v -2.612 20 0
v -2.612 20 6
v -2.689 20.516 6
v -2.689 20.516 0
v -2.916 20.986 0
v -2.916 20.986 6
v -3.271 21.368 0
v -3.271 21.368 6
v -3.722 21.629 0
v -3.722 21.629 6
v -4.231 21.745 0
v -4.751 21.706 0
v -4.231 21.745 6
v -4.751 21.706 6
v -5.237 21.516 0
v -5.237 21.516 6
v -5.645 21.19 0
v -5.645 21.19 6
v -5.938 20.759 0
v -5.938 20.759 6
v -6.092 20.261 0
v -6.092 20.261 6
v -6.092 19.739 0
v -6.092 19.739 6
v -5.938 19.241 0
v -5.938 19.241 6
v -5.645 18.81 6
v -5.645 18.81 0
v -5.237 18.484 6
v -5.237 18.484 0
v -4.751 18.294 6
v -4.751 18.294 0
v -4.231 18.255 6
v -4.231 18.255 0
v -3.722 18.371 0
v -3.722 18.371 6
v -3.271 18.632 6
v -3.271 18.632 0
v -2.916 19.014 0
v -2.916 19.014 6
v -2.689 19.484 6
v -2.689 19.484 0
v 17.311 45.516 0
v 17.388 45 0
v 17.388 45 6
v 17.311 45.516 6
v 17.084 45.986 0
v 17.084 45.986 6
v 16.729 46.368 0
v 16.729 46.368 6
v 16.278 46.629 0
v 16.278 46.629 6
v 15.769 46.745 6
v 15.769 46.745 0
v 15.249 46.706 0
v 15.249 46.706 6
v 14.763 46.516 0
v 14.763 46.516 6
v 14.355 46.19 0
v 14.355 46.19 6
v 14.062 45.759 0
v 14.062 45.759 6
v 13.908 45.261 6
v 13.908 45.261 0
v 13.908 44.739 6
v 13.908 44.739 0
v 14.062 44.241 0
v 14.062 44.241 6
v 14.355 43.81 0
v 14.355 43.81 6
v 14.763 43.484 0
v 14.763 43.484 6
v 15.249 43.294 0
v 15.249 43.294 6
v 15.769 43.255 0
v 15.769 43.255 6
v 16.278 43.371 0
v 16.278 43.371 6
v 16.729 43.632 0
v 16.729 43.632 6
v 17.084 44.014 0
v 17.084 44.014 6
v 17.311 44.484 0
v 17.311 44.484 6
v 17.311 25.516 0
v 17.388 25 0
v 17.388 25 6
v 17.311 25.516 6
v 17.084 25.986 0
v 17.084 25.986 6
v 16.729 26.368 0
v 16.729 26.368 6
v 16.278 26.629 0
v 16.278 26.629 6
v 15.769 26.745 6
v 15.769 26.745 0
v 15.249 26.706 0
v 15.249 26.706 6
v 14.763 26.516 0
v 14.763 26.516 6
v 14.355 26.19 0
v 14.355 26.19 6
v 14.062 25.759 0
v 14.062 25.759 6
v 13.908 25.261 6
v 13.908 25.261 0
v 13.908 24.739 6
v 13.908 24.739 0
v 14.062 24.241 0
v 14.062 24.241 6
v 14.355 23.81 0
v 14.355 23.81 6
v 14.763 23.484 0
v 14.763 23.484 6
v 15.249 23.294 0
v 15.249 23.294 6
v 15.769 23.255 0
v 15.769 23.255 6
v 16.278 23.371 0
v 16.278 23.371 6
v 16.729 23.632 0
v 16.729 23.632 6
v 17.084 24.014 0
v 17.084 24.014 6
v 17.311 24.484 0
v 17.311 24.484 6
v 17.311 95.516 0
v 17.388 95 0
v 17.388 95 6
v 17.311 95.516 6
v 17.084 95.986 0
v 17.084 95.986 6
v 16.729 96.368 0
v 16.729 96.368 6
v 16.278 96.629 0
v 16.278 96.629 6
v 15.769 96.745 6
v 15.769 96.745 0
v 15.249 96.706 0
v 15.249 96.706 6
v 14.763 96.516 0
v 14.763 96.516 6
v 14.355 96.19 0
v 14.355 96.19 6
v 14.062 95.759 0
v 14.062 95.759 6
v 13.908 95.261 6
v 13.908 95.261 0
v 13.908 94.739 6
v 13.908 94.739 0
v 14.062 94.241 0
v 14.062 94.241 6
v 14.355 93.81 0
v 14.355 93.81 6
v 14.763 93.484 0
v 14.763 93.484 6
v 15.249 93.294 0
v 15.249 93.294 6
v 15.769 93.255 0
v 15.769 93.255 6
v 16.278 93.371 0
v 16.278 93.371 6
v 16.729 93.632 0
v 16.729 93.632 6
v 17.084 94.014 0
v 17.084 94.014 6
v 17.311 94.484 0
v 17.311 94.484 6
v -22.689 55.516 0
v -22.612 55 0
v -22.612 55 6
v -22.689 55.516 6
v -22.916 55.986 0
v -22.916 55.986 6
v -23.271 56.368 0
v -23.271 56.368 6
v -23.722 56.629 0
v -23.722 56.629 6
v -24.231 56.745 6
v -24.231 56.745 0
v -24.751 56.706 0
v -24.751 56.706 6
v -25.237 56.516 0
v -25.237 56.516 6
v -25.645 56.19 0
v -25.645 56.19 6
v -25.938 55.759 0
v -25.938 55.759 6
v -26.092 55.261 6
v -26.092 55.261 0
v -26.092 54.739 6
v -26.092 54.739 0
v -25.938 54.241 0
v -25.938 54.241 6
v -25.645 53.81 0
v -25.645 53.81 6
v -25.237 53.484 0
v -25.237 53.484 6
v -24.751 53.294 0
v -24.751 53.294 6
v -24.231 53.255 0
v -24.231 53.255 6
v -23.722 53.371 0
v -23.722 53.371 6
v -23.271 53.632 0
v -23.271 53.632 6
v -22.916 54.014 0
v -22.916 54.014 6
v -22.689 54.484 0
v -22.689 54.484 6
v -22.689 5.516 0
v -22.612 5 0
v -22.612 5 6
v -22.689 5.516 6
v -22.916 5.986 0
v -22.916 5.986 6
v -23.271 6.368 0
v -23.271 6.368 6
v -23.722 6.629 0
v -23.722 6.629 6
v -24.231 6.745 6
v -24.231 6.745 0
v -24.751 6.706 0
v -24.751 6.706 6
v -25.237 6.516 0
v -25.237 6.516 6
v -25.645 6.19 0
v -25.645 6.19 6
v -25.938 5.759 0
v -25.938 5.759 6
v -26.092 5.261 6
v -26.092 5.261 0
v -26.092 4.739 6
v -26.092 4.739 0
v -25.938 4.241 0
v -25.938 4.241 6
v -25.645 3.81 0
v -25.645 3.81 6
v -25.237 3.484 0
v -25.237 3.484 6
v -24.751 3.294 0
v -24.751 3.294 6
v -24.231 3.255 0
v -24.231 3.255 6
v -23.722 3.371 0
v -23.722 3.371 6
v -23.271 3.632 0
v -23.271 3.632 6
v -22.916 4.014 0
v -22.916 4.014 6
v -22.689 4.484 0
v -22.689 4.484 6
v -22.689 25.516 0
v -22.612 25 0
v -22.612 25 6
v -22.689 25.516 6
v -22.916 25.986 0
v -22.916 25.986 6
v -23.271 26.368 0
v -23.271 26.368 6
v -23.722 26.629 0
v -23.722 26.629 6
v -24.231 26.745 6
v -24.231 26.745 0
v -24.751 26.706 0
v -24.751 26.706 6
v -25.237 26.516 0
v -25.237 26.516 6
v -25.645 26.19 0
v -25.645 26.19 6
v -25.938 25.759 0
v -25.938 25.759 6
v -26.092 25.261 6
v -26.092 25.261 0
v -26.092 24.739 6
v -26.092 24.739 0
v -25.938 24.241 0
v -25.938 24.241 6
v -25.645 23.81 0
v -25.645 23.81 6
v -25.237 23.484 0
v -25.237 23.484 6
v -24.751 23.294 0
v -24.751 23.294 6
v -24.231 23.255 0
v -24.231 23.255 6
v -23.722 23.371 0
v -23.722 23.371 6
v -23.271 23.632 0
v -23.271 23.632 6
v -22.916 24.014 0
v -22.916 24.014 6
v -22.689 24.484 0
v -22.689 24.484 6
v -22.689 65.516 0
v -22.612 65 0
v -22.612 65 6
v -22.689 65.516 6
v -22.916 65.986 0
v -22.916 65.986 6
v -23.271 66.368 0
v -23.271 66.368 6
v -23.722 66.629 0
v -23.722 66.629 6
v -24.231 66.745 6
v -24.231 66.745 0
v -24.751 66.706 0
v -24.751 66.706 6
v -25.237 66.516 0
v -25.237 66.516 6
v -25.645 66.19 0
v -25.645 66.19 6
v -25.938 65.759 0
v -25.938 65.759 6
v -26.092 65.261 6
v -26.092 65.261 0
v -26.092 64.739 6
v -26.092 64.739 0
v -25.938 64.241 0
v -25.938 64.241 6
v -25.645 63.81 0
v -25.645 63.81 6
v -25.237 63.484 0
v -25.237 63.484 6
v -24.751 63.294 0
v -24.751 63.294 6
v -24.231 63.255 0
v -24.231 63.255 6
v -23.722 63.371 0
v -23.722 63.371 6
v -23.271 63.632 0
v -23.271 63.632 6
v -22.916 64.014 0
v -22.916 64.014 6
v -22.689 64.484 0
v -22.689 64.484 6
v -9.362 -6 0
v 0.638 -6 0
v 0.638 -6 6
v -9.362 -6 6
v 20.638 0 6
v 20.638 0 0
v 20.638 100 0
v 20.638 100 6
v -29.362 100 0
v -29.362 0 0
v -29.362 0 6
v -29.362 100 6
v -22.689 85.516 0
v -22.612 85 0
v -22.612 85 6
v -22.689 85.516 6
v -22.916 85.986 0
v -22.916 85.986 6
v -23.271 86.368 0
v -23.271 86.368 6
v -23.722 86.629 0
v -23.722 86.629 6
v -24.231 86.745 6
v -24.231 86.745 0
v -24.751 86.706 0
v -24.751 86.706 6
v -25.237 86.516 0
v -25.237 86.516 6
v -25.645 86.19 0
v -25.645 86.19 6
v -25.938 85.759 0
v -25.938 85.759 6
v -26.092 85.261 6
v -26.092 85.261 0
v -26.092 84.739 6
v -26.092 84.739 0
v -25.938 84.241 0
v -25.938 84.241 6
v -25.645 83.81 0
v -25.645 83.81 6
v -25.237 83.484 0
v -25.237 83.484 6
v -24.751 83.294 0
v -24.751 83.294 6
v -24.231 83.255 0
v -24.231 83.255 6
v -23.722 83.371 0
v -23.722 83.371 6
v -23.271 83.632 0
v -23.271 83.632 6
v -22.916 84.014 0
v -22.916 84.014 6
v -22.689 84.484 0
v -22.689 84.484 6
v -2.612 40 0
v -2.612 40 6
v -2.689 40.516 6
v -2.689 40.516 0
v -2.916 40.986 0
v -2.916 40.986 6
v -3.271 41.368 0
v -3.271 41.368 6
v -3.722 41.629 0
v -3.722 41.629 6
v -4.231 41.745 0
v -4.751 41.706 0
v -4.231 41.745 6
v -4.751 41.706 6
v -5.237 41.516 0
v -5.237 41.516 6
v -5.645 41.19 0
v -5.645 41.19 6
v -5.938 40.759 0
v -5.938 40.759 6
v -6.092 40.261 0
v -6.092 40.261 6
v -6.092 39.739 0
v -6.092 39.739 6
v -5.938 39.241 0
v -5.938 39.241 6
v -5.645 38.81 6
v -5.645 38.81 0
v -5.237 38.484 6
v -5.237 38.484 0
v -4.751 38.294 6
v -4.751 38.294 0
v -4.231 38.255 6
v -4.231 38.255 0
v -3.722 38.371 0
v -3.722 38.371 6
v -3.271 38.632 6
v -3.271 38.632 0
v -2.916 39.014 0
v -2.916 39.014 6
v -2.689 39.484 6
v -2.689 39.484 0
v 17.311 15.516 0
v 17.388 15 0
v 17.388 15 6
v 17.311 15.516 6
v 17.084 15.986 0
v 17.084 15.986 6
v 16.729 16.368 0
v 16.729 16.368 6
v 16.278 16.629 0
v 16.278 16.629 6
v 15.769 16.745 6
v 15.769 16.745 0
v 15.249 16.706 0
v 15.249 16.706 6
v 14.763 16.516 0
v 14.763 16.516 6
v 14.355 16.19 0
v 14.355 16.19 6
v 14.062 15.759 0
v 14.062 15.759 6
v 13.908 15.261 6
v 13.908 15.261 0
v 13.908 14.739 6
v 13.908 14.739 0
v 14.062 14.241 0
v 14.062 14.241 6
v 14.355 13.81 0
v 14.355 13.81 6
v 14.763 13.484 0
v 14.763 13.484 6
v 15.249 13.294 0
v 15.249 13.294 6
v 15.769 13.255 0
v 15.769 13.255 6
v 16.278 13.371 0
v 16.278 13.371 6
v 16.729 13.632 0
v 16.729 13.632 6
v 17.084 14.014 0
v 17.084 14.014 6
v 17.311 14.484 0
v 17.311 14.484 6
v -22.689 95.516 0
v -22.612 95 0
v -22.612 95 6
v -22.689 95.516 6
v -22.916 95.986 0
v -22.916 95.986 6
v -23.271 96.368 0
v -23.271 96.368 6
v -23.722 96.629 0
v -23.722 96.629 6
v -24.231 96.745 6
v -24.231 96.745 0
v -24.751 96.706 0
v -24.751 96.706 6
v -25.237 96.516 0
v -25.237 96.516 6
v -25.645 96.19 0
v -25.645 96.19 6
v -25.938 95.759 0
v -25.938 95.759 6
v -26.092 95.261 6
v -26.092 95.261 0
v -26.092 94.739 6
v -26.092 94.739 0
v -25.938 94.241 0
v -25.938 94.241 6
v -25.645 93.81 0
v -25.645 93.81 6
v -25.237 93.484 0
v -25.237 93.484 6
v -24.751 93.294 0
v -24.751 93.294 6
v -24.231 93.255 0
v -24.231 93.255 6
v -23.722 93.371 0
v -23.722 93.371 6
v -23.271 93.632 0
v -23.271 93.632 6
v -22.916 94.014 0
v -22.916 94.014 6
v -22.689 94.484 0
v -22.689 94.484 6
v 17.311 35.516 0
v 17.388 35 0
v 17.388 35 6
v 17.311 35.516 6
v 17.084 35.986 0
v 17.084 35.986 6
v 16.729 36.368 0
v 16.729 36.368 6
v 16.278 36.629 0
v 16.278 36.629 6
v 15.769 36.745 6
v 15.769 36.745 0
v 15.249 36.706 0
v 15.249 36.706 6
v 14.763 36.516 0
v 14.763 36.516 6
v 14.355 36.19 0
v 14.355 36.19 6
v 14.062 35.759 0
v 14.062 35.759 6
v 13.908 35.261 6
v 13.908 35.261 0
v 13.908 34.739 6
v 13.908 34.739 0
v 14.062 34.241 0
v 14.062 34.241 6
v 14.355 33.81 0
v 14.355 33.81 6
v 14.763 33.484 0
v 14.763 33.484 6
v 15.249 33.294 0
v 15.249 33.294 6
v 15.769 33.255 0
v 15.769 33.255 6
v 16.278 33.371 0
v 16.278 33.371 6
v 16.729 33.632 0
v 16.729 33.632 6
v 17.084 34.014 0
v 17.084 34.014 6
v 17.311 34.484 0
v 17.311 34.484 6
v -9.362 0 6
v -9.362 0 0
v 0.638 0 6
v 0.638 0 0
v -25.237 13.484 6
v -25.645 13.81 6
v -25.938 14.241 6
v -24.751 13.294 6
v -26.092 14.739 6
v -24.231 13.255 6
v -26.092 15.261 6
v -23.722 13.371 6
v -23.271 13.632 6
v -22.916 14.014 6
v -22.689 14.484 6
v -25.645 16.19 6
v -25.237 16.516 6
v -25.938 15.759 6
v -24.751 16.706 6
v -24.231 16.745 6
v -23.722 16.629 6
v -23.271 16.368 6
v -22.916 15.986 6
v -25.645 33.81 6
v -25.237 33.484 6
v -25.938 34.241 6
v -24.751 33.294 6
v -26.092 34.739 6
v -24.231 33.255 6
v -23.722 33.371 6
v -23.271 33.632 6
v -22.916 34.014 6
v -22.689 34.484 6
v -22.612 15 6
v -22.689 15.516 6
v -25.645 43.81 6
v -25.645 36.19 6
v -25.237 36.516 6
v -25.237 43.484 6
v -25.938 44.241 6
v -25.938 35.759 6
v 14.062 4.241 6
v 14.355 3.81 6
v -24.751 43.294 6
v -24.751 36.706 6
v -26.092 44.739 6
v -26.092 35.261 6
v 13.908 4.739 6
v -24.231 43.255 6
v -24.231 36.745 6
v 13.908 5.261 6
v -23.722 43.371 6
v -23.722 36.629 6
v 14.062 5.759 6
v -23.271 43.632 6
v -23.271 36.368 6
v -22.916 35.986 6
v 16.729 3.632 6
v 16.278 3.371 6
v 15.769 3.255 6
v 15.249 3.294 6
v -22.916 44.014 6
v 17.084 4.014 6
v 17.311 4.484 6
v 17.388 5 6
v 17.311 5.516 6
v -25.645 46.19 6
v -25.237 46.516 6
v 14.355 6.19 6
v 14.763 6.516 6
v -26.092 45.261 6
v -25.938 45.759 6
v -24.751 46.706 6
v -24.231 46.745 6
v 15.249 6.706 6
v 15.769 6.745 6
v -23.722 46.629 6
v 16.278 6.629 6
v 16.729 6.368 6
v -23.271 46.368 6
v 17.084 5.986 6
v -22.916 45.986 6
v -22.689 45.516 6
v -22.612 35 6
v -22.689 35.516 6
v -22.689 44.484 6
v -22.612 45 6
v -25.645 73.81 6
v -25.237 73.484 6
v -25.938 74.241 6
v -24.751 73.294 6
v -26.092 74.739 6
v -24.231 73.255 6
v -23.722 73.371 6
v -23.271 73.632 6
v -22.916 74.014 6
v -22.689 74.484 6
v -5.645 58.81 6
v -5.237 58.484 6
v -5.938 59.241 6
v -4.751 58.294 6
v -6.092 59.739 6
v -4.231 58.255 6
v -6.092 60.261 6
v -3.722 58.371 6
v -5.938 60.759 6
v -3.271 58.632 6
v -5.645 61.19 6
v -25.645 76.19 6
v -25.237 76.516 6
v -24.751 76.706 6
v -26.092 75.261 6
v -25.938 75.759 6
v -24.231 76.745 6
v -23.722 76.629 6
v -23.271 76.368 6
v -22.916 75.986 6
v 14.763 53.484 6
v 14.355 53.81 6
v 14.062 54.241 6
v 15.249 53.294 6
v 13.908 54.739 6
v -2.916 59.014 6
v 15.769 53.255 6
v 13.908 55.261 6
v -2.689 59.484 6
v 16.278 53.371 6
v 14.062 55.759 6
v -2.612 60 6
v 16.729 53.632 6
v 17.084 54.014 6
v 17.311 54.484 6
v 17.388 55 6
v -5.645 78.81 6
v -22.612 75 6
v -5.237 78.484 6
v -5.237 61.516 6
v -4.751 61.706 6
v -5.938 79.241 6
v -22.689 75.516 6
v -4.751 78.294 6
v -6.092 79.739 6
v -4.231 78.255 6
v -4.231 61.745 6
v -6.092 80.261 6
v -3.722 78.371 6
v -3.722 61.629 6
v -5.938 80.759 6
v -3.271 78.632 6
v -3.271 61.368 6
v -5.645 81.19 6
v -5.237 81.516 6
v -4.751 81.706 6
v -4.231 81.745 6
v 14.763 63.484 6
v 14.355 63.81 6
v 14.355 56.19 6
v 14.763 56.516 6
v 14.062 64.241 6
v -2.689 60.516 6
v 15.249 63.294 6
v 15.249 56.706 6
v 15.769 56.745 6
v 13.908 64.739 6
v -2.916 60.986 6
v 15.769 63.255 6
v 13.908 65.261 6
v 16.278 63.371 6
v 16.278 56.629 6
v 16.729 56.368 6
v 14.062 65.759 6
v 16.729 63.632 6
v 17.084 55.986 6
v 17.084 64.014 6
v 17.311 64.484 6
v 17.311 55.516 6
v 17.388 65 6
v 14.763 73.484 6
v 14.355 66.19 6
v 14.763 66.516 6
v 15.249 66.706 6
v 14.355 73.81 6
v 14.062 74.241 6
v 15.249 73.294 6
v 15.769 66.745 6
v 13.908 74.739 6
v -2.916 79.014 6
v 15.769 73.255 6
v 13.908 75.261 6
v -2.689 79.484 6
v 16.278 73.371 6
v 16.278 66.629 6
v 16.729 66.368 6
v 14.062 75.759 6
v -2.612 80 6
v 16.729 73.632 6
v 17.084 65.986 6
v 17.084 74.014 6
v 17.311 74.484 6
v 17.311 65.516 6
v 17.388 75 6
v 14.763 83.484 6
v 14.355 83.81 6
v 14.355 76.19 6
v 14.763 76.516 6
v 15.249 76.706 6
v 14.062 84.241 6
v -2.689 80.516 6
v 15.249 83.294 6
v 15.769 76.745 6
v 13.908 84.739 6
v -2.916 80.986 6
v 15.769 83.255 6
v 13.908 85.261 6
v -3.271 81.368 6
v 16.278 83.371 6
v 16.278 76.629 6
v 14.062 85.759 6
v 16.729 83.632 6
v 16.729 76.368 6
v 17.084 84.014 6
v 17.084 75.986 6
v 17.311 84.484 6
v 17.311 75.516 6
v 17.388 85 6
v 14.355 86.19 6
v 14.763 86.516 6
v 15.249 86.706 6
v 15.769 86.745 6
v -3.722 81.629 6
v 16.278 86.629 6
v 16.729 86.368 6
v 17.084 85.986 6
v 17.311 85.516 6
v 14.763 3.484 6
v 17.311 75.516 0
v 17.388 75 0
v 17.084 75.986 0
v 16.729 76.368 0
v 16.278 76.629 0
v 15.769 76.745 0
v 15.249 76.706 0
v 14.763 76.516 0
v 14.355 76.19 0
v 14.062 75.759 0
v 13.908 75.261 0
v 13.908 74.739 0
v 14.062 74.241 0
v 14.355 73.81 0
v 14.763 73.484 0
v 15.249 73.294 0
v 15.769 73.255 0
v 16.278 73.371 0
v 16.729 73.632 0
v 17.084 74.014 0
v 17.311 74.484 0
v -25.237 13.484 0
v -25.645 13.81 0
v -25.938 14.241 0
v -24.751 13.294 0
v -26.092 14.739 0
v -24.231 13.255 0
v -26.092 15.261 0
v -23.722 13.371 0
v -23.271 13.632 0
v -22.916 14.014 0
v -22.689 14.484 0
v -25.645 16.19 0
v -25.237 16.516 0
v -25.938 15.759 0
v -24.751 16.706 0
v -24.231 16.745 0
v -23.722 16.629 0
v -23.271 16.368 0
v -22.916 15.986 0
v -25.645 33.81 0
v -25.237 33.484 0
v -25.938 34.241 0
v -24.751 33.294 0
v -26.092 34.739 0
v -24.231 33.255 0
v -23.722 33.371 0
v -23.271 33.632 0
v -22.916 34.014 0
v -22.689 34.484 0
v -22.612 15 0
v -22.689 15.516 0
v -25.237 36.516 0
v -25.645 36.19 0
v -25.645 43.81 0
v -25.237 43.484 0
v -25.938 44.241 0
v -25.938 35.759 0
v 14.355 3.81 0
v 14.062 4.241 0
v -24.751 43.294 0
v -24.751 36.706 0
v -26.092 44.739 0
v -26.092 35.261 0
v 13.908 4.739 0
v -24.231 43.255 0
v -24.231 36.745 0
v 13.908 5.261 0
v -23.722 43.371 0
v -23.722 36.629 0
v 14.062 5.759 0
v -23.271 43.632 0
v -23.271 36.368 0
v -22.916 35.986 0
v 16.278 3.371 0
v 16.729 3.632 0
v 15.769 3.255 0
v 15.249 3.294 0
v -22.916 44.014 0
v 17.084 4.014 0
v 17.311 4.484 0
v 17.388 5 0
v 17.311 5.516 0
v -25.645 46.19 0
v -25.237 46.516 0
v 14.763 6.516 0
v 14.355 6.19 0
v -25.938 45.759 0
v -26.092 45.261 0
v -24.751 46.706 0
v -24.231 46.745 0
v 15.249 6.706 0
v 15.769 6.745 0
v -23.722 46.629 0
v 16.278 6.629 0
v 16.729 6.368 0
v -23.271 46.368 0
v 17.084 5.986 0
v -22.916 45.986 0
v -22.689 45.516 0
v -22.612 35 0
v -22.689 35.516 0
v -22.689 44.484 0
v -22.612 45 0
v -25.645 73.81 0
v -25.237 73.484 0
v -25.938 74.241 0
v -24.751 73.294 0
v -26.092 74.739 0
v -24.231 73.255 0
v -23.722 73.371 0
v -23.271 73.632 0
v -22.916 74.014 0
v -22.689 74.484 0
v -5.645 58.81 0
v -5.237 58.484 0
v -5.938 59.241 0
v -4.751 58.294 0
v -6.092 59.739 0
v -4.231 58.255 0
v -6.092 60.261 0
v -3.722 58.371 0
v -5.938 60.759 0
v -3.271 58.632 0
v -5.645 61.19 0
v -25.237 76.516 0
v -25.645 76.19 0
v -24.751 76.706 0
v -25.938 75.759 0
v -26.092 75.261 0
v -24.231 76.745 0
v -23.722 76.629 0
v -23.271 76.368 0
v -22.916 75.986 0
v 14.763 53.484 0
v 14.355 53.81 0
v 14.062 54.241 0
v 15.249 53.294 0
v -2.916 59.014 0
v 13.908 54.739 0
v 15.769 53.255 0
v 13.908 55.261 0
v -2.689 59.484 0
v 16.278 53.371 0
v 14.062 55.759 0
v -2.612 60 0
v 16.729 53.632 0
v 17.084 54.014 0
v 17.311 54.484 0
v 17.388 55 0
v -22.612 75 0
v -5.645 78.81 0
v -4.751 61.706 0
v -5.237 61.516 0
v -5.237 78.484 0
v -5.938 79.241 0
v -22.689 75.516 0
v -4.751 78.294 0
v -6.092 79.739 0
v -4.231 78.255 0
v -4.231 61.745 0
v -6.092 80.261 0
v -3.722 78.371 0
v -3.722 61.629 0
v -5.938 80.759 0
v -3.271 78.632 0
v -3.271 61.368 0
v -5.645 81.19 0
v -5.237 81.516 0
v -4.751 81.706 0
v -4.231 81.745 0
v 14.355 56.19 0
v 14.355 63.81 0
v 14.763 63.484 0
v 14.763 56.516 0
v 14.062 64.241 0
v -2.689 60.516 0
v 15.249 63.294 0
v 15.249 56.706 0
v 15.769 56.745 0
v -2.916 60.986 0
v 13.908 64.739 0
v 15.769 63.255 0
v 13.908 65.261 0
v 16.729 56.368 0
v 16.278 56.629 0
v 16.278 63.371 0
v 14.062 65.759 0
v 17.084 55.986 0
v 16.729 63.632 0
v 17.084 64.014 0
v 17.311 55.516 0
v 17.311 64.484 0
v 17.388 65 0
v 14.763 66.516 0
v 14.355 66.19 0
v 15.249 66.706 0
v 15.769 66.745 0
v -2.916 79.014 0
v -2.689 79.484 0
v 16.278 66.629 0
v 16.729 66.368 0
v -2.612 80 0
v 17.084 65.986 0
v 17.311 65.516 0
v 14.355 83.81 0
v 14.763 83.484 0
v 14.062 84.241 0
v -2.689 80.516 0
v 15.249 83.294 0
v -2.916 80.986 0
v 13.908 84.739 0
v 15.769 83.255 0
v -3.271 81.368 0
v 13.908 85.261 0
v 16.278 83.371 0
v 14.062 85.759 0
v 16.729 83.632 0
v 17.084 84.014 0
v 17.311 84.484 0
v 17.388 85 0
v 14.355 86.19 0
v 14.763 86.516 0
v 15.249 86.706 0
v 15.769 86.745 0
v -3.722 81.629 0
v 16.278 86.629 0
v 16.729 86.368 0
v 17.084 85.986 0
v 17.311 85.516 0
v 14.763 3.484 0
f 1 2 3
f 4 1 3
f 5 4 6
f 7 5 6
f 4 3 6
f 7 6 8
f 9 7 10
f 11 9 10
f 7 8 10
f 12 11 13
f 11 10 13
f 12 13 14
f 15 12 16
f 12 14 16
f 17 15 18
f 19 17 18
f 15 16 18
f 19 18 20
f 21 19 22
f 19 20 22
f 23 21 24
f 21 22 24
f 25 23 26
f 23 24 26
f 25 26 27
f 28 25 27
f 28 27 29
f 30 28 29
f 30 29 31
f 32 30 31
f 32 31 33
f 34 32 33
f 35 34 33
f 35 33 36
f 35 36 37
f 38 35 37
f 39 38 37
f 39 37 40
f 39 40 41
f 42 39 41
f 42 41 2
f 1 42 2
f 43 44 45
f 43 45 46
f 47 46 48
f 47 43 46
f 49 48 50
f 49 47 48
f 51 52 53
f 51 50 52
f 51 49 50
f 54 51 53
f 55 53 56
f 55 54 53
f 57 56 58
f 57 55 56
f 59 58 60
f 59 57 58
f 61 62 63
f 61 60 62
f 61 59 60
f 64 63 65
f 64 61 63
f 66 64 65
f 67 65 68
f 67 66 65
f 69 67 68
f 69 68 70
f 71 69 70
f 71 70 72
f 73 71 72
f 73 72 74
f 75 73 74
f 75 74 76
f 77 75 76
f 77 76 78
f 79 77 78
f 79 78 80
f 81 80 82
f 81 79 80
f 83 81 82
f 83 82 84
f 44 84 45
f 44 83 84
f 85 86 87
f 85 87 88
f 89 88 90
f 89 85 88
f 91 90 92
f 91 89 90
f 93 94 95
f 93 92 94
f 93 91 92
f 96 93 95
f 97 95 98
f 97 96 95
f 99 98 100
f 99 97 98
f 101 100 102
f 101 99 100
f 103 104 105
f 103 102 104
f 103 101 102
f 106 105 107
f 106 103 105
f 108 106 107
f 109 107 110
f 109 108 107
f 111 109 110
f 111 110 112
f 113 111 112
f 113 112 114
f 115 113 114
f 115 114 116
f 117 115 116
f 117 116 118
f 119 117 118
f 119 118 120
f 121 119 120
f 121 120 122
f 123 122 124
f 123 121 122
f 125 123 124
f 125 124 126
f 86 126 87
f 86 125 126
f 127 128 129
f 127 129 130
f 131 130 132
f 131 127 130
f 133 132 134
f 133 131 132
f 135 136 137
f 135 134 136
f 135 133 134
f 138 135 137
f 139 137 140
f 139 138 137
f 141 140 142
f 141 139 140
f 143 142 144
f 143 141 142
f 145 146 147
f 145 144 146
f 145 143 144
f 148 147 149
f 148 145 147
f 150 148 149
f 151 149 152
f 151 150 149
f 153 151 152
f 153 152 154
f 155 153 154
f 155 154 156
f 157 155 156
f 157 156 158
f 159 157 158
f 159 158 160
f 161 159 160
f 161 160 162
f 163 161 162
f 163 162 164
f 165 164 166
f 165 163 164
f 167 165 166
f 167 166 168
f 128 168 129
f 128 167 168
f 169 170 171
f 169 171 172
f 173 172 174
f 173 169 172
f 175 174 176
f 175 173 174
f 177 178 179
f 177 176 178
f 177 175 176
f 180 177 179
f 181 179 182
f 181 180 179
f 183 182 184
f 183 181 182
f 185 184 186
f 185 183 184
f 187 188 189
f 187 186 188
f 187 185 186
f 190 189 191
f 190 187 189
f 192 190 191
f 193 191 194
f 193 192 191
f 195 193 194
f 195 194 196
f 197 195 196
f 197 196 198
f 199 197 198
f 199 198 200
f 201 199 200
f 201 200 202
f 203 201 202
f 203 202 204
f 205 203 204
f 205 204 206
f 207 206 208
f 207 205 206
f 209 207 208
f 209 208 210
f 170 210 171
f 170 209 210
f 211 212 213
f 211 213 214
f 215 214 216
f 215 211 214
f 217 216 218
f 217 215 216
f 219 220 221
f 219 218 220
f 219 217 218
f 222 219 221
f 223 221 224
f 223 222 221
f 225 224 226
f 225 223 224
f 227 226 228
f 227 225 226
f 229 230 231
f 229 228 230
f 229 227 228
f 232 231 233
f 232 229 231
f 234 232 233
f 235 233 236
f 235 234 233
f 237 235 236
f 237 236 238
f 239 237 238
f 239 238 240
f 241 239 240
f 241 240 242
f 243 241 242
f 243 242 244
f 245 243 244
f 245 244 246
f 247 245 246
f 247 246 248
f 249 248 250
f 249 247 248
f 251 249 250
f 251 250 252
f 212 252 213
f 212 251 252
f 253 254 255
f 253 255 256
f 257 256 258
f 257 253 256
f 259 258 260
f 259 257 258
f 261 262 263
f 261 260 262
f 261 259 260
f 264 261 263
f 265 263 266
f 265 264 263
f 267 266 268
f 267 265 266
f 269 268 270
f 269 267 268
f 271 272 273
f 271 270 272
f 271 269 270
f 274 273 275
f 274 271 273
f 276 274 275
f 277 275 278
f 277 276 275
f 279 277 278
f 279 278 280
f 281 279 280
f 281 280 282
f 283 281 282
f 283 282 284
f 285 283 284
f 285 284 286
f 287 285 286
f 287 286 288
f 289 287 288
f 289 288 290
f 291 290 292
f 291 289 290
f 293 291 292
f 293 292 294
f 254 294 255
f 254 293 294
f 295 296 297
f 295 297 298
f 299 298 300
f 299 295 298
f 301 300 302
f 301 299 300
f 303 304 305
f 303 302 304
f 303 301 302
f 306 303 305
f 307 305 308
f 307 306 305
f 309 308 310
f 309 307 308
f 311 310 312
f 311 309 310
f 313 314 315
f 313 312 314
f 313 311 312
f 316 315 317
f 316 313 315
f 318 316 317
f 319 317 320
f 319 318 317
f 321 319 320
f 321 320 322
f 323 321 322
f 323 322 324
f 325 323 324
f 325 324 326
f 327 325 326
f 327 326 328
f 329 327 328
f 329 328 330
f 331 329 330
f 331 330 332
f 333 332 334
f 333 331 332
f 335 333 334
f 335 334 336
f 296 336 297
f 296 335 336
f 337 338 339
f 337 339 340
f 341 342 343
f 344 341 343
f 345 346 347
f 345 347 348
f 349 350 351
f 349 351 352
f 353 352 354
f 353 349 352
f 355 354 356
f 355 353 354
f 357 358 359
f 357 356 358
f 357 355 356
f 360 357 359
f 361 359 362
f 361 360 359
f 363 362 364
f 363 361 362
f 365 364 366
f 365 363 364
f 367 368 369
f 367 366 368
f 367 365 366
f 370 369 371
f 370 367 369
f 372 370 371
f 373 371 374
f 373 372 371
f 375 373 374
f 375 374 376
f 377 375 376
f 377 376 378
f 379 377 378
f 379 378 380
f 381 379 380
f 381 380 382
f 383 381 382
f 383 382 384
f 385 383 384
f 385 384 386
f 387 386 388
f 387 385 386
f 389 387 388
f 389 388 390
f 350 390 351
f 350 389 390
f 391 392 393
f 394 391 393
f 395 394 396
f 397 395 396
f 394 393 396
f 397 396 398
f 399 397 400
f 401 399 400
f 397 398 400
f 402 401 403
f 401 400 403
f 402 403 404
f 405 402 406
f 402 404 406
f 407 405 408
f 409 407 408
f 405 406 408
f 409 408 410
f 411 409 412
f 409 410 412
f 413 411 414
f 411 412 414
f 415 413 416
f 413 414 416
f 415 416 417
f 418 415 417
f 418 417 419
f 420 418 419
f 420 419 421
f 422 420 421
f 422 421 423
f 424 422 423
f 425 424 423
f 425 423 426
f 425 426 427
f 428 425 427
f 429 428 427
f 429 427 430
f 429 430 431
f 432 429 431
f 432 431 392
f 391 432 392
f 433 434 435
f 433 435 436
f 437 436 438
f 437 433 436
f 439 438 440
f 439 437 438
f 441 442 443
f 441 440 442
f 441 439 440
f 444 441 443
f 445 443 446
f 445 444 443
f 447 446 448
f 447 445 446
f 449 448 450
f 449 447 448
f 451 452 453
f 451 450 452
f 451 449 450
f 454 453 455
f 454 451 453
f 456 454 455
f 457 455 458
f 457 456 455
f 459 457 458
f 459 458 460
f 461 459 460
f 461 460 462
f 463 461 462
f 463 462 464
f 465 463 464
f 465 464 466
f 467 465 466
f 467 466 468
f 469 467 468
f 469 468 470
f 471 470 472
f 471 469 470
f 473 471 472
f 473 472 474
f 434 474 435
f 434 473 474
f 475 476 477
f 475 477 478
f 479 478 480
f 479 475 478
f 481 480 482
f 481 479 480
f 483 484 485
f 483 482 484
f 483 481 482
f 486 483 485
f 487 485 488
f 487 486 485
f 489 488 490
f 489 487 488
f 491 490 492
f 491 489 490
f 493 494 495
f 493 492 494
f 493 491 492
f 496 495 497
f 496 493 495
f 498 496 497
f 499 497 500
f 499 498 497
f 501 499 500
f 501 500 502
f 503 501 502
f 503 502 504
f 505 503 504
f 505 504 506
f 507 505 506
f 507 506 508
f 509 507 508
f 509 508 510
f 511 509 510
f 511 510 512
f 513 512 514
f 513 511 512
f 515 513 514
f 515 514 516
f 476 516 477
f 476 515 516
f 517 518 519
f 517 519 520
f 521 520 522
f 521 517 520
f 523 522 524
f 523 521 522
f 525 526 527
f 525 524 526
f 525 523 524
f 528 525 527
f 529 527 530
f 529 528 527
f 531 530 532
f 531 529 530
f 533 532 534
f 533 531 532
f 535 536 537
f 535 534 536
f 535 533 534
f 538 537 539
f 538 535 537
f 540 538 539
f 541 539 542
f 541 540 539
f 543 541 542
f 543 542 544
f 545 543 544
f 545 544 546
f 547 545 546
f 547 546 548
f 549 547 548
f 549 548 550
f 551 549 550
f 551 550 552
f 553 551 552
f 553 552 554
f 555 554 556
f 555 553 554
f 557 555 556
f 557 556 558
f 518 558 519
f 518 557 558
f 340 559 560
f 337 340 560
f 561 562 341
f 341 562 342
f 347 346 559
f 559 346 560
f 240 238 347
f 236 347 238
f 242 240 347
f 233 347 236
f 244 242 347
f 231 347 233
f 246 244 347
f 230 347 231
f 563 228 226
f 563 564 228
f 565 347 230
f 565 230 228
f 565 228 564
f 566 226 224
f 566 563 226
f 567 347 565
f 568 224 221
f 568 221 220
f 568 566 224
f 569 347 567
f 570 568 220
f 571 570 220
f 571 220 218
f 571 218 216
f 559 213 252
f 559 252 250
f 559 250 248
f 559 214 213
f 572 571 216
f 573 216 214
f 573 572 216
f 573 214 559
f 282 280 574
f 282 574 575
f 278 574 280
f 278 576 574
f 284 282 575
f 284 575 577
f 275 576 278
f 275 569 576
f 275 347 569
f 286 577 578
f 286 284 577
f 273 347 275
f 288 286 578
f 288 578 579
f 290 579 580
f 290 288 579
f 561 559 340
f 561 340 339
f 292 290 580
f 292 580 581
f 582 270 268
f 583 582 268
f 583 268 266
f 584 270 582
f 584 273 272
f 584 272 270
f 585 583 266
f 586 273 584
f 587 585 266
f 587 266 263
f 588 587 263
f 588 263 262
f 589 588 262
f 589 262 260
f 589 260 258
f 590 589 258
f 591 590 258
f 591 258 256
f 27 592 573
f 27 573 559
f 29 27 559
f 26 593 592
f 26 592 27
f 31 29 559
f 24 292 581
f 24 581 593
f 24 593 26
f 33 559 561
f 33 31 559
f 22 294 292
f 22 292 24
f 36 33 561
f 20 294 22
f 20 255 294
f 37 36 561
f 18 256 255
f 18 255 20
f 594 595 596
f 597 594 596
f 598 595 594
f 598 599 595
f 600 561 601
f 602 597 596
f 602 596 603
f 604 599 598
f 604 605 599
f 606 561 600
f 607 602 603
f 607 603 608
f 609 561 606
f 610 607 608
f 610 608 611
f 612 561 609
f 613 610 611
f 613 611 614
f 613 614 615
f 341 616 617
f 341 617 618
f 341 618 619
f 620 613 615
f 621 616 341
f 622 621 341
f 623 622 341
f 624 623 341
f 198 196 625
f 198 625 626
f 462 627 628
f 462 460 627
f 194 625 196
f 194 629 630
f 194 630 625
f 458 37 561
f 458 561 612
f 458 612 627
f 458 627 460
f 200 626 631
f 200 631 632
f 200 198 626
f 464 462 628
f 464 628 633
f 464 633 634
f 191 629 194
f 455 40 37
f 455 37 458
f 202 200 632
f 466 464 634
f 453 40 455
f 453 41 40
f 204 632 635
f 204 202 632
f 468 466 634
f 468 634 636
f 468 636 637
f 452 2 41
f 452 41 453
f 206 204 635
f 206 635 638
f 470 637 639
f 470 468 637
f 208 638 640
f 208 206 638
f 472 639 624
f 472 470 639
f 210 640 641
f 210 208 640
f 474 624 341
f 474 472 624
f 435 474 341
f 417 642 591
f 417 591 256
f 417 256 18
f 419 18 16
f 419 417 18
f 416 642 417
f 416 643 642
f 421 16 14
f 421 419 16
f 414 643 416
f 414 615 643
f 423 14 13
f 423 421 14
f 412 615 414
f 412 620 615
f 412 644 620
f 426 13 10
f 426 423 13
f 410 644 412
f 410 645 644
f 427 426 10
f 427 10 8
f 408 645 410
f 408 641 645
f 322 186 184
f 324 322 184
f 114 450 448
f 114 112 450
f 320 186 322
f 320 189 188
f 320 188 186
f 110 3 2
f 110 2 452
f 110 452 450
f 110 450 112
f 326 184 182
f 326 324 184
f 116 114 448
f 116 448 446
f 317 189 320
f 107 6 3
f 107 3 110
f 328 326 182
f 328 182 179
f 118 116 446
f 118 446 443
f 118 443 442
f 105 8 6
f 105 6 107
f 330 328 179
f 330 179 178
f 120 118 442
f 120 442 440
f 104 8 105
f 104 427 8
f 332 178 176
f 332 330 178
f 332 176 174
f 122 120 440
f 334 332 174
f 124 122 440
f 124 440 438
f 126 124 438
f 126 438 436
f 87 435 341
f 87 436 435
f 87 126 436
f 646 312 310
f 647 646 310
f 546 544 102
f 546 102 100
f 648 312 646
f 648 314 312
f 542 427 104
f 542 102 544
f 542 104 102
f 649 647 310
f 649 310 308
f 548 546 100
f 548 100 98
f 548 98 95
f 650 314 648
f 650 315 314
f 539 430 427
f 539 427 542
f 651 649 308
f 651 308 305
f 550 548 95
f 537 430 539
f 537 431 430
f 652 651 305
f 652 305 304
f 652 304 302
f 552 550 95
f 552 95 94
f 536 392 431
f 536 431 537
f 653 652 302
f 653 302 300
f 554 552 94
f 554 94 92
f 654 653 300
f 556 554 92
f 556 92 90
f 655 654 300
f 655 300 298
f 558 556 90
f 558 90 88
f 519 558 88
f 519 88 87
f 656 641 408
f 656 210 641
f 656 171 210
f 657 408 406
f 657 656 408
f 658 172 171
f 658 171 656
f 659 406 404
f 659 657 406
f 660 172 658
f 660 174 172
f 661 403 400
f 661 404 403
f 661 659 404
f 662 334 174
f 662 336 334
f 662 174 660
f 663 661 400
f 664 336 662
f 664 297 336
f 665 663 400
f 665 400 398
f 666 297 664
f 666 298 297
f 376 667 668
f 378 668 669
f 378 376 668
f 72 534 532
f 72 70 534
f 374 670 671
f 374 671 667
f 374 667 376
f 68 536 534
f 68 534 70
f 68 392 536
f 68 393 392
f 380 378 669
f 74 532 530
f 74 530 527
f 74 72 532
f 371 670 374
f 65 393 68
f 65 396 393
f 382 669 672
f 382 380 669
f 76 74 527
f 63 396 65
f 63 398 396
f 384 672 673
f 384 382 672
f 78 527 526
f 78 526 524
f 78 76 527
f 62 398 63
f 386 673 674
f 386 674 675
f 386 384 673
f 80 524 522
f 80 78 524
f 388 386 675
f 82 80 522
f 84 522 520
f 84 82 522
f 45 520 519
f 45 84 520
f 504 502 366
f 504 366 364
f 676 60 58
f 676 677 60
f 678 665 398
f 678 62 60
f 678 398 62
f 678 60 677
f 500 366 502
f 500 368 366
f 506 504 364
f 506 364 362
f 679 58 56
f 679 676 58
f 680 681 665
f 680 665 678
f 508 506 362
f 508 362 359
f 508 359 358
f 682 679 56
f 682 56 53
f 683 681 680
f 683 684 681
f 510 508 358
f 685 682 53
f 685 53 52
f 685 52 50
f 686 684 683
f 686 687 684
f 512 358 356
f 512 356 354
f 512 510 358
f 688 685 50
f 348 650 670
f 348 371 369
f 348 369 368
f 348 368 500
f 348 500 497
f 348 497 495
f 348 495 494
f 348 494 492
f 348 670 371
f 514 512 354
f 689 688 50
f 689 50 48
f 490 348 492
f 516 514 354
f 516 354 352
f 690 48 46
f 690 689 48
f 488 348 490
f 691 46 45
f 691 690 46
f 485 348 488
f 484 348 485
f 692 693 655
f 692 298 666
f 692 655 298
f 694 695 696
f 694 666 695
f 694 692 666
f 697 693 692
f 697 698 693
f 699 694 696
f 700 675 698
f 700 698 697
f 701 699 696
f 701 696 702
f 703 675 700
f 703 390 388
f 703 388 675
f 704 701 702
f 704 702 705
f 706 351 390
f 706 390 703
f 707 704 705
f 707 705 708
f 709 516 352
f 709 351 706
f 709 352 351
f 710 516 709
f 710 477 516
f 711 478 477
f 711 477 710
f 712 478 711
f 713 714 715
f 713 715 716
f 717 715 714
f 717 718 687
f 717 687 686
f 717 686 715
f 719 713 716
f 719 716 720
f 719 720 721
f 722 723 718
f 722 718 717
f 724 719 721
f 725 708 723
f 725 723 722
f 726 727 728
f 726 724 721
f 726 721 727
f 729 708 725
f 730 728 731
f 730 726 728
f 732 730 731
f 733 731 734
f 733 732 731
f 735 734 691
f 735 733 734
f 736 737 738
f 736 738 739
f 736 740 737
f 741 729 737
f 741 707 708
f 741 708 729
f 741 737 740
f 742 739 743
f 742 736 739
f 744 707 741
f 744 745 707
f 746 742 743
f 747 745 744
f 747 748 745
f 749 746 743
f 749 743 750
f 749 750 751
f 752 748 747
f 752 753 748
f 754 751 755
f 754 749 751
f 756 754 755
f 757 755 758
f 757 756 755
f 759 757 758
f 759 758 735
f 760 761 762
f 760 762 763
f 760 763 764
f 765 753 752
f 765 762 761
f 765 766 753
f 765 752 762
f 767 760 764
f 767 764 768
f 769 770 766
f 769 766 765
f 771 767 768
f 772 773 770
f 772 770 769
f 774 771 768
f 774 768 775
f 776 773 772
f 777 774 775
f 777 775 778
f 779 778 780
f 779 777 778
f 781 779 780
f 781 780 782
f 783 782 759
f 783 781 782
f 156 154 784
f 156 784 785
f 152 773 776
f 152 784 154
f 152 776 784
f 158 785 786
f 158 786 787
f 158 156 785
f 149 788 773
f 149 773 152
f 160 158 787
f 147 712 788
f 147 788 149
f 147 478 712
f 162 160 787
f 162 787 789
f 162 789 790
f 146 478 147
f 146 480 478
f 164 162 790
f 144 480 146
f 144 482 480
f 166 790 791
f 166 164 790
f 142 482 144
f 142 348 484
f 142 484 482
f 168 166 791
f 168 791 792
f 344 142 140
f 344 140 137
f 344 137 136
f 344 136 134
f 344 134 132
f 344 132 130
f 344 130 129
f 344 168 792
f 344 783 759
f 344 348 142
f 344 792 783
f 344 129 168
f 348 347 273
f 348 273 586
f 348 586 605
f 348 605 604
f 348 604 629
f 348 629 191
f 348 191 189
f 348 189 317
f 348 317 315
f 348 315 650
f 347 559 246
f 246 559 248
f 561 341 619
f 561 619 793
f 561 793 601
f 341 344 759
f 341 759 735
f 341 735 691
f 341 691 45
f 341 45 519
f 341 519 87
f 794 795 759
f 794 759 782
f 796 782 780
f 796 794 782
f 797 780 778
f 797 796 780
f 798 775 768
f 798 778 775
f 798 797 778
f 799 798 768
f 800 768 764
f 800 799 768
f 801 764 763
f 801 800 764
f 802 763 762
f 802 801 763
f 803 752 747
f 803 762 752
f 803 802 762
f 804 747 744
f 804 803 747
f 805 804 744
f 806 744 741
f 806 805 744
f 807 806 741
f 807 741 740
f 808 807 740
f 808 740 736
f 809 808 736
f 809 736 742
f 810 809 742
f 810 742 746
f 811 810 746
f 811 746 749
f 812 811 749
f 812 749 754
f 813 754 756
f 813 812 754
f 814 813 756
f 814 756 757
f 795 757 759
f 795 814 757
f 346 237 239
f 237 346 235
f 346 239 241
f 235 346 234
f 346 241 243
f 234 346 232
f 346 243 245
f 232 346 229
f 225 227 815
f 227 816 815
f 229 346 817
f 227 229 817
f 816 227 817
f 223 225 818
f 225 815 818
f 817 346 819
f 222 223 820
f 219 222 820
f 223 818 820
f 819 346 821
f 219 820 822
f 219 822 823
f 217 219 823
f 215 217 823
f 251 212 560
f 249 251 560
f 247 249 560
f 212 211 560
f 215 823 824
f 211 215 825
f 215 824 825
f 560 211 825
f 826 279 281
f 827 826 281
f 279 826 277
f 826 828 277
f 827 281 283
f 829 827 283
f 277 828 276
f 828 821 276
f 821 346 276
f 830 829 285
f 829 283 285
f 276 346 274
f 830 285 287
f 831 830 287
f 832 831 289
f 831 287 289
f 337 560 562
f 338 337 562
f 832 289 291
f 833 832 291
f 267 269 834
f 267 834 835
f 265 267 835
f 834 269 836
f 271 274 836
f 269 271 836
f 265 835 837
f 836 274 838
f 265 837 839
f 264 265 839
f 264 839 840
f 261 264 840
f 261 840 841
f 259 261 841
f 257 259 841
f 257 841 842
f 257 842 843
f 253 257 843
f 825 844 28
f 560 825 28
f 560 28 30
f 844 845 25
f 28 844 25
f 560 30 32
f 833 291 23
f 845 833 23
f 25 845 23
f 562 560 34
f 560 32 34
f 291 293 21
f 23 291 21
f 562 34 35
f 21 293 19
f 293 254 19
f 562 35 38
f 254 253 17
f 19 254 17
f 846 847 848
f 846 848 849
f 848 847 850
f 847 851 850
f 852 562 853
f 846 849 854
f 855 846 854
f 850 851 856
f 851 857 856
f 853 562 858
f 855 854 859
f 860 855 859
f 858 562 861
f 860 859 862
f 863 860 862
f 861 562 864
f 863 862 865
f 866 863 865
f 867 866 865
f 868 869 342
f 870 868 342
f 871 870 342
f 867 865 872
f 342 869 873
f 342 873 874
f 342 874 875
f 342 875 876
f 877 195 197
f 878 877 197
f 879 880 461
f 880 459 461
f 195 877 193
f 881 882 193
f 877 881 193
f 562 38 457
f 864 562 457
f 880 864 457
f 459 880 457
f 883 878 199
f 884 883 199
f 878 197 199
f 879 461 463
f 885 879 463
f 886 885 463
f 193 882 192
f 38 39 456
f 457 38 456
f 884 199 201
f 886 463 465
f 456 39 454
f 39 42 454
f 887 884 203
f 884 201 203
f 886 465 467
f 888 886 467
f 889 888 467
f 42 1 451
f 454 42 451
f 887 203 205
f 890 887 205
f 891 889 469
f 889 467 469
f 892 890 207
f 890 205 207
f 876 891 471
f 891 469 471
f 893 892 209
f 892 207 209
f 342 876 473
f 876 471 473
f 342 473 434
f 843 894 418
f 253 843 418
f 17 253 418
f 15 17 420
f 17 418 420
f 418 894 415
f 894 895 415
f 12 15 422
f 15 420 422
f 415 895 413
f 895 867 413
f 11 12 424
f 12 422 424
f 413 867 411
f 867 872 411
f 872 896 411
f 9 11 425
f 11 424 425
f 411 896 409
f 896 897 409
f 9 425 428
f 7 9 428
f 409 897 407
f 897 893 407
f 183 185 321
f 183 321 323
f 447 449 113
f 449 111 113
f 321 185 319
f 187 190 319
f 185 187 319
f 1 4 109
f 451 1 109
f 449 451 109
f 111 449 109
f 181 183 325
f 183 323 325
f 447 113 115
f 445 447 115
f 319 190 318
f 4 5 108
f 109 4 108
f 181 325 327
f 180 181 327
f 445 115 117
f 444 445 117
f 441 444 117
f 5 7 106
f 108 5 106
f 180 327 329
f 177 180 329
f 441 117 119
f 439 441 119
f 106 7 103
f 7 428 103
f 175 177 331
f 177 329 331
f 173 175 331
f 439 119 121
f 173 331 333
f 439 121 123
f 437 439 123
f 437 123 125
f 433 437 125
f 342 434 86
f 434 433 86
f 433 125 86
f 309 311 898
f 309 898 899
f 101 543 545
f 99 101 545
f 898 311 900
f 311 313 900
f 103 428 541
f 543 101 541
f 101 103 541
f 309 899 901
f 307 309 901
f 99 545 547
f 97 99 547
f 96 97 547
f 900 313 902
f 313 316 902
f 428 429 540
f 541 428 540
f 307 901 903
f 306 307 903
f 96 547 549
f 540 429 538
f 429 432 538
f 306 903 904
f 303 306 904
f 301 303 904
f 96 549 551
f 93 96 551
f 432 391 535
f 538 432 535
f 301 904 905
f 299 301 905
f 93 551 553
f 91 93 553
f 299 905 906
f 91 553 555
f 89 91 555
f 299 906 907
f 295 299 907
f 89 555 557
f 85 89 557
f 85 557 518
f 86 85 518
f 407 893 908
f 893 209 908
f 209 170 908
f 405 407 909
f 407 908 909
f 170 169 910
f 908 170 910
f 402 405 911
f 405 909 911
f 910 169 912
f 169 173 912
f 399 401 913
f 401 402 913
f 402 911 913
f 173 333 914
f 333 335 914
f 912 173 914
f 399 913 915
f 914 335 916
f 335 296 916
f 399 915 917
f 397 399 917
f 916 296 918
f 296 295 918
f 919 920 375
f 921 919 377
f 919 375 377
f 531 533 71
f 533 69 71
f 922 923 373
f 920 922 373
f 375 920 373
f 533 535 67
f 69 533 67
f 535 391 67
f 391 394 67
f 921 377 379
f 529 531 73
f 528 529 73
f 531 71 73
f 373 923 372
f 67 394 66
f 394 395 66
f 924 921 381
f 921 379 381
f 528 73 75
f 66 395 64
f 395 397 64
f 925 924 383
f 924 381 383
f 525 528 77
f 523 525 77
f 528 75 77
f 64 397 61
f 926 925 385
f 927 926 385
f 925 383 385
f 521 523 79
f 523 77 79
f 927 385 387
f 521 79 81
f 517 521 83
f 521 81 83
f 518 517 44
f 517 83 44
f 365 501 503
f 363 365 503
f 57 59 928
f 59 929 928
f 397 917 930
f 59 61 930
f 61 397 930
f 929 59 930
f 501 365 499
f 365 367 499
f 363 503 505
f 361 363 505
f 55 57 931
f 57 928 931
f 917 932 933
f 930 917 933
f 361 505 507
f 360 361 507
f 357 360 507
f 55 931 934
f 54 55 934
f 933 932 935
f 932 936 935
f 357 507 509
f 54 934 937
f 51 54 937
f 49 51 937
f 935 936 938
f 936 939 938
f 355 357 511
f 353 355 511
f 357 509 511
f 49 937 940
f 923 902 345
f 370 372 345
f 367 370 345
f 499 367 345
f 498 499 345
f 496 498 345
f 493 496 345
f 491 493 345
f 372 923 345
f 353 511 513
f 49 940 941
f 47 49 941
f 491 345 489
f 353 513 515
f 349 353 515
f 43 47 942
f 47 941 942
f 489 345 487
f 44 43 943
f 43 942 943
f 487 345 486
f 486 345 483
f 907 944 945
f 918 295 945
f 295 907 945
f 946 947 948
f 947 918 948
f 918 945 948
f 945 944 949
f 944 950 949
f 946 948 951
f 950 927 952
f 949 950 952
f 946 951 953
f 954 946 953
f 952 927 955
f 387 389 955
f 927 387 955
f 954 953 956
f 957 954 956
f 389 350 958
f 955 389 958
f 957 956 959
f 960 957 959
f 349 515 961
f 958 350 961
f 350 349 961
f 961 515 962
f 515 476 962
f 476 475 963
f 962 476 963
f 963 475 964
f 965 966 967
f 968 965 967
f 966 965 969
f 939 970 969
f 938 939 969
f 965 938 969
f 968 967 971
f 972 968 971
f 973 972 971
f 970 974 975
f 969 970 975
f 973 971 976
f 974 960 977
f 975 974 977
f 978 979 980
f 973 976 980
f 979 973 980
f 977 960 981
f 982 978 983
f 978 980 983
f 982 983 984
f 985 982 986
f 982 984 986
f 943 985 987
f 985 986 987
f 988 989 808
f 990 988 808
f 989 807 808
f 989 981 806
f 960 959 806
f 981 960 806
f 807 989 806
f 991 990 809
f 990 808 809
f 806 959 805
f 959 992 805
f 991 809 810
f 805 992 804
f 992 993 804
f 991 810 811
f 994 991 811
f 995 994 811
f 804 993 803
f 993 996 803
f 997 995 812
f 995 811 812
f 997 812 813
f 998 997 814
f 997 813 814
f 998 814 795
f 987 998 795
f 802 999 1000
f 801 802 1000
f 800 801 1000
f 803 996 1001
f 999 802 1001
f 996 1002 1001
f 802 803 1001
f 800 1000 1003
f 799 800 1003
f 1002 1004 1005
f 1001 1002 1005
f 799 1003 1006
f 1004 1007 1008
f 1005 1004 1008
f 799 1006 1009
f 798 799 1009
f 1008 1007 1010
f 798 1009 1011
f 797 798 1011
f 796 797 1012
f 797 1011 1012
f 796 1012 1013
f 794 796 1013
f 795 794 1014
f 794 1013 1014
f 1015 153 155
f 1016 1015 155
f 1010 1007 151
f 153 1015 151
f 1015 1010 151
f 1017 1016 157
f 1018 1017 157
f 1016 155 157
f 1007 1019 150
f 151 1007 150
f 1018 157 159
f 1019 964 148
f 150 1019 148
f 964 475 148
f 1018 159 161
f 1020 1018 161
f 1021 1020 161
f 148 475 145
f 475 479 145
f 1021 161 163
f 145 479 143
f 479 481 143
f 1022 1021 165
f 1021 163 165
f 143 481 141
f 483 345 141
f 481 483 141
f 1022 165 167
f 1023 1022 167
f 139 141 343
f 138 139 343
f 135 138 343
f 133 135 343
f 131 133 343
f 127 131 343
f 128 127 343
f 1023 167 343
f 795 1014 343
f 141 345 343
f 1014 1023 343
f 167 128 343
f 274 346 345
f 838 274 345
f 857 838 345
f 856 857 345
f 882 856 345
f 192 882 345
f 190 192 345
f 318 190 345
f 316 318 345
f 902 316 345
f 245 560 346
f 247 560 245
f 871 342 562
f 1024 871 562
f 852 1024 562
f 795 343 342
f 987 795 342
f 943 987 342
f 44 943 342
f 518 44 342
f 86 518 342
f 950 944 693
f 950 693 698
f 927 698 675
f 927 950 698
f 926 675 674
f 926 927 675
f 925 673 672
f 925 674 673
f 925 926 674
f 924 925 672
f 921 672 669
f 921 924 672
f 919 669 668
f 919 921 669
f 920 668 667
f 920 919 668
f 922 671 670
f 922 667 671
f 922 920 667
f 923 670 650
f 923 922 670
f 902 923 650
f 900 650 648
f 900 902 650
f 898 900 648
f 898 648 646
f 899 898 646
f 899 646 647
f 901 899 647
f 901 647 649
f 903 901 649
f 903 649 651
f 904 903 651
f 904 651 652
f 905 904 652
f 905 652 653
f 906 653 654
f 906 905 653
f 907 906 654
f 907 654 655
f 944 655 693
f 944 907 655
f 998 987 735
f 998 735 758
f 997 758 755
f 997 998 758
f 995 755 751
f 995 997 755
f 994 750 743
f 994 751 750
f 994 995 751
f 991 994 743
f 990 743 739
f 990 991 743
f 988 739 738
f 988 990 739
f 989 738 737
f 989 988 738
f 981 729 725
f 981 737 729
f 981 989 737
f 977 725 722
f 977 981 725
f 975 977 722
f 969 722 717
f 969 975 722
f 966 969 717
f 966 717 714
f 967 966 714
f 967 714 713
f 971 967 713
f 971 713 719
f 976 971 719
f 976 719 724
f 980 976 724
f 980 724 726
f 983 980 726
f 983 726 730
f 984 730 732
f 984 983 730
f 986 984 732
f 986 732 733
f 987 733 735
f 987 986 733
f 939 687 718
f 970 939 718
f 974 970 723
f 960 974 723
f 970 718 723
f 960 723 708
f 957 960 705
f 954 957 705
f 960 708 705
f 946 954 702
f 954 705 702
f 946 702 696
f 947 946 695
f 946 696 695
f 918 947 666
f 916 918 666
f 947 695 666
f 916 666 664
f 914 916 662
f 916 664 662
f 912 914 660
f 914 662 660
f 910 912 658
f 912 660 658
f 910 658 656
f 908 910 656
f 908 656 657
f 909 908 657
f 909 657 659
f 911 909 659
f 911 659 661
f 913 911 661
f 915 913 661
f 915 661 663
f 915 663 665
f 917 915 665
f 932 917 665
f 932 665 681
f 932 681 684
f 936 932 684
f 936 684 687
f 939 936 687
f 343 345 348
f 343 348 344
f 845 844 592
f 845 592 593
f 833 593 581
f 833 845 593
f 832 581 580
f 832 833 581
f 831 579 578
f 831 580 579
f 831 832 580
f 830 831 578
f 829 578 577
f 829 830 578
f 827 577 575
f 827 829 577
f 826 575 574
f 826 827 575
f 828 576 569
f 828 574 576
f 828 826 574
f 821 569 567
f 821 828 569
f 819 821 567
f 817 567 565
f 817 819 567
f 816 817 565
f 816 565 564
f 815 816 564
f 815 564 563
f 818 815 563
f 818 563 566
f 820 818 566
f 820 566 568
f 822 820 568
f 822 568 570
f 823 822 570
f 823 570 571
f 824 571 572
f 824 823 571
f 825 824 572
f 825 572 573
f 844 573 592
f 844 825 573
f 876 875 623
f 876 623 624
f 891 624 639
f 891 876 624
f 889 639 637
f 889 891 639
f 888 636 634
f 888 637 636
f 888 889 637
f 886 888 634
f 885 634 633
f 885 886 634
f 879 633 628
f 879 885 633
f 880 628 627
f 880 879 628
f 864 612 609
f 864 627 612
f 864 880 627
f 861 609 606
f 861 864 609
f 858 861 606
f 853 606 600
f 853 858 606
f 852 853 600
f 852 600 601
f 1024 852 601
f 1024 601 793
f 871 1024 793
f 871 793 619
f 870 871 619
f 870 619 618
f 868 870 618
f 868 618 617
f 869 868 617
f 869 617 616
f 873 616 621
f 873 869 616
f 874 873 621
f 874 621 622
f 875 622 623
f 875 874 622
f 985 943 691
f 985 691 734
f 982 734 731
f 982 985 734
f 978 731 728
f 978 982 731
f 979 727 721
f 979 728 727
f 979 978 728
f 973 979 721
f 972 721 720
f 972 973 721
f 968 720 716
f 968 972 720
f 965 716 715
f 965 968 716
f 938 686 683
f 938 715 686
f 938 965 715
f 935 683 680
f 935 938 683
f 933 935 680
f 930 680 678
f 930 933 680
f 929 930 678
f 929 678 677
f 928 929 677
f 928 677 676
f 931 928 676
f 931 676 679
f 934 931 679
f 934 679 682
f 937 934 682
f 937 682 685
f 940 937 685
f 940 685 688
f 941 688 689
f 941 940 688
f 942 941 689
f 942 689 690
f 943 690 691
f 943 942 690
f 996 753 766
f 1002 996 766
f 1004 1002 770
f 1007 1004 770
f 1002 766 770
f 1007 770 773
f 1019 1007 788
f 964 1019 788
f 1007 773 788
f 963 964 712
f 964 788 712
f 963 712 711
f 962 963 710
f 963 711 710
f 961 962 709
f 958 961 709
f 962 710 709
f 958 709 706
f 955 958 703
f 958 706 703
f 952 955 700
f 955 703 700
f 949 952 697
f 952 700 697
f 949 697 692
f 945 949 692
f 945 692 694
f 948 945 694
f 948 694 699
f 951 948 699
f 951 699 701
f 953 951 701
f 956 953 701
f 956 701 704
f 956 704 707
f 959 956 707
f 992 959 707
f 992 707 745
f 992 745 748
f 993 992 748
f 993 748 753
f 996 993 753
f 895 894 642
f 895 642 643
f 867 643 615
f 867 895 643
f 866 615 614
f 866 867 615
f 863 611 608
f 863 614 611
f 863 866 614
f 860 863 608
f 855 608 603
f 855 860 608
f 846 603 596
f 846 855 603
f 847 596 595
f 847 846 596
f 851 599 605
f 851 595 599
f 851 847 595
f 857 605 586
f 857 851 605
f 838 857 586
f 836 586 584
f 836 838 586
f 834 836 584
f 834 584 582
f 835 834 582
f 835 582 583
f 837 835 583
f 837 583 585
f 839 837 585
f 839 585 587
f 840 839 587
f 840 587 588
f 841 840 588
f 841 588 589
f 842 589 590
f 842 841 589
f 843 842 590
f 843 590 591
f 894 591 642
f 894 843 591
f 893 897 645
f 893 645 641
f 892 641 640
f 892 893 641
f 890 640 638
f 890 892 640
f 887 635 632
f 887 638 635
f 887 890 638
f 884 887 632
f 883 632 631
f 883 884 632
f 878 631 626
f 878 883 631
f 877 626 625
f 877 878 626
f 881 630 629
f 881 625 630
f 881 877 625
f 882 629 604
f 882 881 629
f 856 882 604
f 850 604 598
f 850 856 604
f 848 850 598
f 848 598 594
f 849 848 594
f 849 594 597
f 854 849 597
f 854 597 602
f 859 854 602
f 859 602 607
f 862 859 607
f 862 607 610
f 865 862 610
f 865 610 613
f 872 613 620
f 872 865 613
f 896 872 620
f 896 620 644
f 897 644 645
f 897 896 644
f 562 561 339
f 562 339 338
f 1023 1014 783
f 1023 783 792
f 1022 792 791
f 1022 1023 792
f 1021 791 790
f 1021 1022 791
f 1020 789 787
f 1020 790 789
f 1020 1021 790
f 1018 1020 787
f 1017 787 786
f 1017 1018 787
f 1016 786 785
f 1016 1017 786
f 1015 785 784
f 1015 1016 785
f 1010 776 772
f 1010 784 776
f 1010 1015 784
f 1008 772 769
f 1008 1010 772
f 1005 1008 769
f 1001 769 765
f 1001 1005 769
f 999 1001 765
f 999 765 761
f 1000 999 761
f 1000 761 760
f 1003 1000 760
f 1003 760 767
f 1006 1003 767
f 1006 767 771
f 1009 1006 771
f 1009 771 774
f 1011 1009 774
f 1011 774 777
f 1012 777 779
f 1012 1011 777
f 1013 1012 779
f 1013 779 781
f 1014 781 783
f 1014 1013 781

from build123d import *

# Parameters (mm, degrees)
ESBO_O1_W                  = 50
ESBO_O1_H                  = 100
RESSALTO_EXTRUS_O1_DEPTH   = 6
CORTE_EXTRUS_O1_DEPTH      = 105.394009728
CORTE_EXTRUS_O1_DEPTH_BACK = 105.394009728
ESBO_O2_R                  = 1.75
ESBO_O3_R                  = 1.75
CORTE_EXTRUS_O2_DEPTH      = 105.394009728
ESBO_O4_W                  = 10
ESBO_O4_H                  = 6
RESSALTO_EXTRUS_O2_DEPTH   = 6


with BuildPart() as part:
    # Esboço1 → Ressalto-extrusão1 (new body)
    with BuildSketch(Plane.XY):
        with Locations((-4.361697279, 50)):
            Rectangle(ESBO_O1_W, ESBO_O1_H)
    extrude(amount=RESSALTO_EXTRUS_O1_DEPTH)

    # Esboço2 → Corte-extrusão1 (cut, two sides: drawn at the far end of the back side and taken through both)
    with BuildSketch(Plane.XY.offset(6).offset(-CORTE_EXTRUS_O1_DEPTH_BACK)):
        with Locations((-24.361697279, 95)):
            Circle(ESBO_O2_R)
        with Locations((-24.361697279, 85)):
            Circle(ESBO_O2_R)
        with Locations((-24.361697279, 75)):
            Circle(ESBO_O2_R)
        with Locations((-24.361697279, 65)):
            Circle(ESBO_O2_R)
        with Locations((-24.361697279, 55)):
            Circle(ESBO_O2_R)
        with Locations((-24.361697279, 45)):
            Circle(ESBO_O2_R)
        with Locations((-24.361697279, 35)):
            Circle(ESBO_O2_R)
        with Locations((-24.361697279, 25)):
            Circle(ESBO_O2_R)
        with Locations((-24.361697279, 15)):
            Circle(ESBO_O2_R)
        with Locations((-24.361697279, 5)):
            Circle(ESBO_O2_R)
        with Locations((15.638302721, 95)):
            Circle(ESBO_O2_R)
        with Locations((15.638302721, 85)):
            Circle(ESBO_O2_R)
        with Locations((15.638302721, 75)):
            Circle(ESBO_O2_R)
        with Locations((15.638302721, 65)):
            Circle(ESBO_O2_R)
        with Locations((15.638302721, 55)):
            Circle(ESBO_O2_R)
        with Locations((15.638302721, 45)):
            Circle(ESBO_O2_R)
        with Locations((15.638302721, 35)):
            Circle(ESBO_O2_R)
        with Locations((15.638302721, 25)):
            Circle(ESBO_O2_R)
        with Locations((15.638302721, 15)):
            Circle(ESBO_O2_R)
        with Locations((15.638302721, 5)):
            Circle(ESBO_O2_R)
    extrude(amount=CORTE_EXTRUS_O1_DEPTH + CORTE_EXTRUS_O1_DEPTH_BACK, mode=Mode.SUBTRACT)

    # Esboço3 → Corte-extrusão2 (cut, through all)
    with BuildSketch(Plane.XY.offset(6)):
        with Locations((-4.361697279, 80)):
            Circle(ESBO_O3_R)
        with Locations((-4.361697279, 60)):
            Circle(ESBO_O3_R)
        with Locations((-4.361697279, 40)):
            Circle(ESBO_O3_R)
        with Locations((-4.361697279, 20)):
            Circle(ESBO_O3_R)
    extrude(amount=-CORTE_EXTRUS_O2_DEPTH, mode=Mode.SUBTRACT)

    # Esboço4 → Ressalto-extrusão2 (add)
    with BuildSketch(Plane(origin=(0, 0, 0), x_dir=(-1, 0, 0), z_dir=(0, -1, 0))):
        with Locations((4.361697279, -3)):
            Rectangle(ESBO_O4_W, ESBO_O4_H)
    extrude(amount=RESSALTO_EXTRUS_O2_DEPTH)


solid = part.part
